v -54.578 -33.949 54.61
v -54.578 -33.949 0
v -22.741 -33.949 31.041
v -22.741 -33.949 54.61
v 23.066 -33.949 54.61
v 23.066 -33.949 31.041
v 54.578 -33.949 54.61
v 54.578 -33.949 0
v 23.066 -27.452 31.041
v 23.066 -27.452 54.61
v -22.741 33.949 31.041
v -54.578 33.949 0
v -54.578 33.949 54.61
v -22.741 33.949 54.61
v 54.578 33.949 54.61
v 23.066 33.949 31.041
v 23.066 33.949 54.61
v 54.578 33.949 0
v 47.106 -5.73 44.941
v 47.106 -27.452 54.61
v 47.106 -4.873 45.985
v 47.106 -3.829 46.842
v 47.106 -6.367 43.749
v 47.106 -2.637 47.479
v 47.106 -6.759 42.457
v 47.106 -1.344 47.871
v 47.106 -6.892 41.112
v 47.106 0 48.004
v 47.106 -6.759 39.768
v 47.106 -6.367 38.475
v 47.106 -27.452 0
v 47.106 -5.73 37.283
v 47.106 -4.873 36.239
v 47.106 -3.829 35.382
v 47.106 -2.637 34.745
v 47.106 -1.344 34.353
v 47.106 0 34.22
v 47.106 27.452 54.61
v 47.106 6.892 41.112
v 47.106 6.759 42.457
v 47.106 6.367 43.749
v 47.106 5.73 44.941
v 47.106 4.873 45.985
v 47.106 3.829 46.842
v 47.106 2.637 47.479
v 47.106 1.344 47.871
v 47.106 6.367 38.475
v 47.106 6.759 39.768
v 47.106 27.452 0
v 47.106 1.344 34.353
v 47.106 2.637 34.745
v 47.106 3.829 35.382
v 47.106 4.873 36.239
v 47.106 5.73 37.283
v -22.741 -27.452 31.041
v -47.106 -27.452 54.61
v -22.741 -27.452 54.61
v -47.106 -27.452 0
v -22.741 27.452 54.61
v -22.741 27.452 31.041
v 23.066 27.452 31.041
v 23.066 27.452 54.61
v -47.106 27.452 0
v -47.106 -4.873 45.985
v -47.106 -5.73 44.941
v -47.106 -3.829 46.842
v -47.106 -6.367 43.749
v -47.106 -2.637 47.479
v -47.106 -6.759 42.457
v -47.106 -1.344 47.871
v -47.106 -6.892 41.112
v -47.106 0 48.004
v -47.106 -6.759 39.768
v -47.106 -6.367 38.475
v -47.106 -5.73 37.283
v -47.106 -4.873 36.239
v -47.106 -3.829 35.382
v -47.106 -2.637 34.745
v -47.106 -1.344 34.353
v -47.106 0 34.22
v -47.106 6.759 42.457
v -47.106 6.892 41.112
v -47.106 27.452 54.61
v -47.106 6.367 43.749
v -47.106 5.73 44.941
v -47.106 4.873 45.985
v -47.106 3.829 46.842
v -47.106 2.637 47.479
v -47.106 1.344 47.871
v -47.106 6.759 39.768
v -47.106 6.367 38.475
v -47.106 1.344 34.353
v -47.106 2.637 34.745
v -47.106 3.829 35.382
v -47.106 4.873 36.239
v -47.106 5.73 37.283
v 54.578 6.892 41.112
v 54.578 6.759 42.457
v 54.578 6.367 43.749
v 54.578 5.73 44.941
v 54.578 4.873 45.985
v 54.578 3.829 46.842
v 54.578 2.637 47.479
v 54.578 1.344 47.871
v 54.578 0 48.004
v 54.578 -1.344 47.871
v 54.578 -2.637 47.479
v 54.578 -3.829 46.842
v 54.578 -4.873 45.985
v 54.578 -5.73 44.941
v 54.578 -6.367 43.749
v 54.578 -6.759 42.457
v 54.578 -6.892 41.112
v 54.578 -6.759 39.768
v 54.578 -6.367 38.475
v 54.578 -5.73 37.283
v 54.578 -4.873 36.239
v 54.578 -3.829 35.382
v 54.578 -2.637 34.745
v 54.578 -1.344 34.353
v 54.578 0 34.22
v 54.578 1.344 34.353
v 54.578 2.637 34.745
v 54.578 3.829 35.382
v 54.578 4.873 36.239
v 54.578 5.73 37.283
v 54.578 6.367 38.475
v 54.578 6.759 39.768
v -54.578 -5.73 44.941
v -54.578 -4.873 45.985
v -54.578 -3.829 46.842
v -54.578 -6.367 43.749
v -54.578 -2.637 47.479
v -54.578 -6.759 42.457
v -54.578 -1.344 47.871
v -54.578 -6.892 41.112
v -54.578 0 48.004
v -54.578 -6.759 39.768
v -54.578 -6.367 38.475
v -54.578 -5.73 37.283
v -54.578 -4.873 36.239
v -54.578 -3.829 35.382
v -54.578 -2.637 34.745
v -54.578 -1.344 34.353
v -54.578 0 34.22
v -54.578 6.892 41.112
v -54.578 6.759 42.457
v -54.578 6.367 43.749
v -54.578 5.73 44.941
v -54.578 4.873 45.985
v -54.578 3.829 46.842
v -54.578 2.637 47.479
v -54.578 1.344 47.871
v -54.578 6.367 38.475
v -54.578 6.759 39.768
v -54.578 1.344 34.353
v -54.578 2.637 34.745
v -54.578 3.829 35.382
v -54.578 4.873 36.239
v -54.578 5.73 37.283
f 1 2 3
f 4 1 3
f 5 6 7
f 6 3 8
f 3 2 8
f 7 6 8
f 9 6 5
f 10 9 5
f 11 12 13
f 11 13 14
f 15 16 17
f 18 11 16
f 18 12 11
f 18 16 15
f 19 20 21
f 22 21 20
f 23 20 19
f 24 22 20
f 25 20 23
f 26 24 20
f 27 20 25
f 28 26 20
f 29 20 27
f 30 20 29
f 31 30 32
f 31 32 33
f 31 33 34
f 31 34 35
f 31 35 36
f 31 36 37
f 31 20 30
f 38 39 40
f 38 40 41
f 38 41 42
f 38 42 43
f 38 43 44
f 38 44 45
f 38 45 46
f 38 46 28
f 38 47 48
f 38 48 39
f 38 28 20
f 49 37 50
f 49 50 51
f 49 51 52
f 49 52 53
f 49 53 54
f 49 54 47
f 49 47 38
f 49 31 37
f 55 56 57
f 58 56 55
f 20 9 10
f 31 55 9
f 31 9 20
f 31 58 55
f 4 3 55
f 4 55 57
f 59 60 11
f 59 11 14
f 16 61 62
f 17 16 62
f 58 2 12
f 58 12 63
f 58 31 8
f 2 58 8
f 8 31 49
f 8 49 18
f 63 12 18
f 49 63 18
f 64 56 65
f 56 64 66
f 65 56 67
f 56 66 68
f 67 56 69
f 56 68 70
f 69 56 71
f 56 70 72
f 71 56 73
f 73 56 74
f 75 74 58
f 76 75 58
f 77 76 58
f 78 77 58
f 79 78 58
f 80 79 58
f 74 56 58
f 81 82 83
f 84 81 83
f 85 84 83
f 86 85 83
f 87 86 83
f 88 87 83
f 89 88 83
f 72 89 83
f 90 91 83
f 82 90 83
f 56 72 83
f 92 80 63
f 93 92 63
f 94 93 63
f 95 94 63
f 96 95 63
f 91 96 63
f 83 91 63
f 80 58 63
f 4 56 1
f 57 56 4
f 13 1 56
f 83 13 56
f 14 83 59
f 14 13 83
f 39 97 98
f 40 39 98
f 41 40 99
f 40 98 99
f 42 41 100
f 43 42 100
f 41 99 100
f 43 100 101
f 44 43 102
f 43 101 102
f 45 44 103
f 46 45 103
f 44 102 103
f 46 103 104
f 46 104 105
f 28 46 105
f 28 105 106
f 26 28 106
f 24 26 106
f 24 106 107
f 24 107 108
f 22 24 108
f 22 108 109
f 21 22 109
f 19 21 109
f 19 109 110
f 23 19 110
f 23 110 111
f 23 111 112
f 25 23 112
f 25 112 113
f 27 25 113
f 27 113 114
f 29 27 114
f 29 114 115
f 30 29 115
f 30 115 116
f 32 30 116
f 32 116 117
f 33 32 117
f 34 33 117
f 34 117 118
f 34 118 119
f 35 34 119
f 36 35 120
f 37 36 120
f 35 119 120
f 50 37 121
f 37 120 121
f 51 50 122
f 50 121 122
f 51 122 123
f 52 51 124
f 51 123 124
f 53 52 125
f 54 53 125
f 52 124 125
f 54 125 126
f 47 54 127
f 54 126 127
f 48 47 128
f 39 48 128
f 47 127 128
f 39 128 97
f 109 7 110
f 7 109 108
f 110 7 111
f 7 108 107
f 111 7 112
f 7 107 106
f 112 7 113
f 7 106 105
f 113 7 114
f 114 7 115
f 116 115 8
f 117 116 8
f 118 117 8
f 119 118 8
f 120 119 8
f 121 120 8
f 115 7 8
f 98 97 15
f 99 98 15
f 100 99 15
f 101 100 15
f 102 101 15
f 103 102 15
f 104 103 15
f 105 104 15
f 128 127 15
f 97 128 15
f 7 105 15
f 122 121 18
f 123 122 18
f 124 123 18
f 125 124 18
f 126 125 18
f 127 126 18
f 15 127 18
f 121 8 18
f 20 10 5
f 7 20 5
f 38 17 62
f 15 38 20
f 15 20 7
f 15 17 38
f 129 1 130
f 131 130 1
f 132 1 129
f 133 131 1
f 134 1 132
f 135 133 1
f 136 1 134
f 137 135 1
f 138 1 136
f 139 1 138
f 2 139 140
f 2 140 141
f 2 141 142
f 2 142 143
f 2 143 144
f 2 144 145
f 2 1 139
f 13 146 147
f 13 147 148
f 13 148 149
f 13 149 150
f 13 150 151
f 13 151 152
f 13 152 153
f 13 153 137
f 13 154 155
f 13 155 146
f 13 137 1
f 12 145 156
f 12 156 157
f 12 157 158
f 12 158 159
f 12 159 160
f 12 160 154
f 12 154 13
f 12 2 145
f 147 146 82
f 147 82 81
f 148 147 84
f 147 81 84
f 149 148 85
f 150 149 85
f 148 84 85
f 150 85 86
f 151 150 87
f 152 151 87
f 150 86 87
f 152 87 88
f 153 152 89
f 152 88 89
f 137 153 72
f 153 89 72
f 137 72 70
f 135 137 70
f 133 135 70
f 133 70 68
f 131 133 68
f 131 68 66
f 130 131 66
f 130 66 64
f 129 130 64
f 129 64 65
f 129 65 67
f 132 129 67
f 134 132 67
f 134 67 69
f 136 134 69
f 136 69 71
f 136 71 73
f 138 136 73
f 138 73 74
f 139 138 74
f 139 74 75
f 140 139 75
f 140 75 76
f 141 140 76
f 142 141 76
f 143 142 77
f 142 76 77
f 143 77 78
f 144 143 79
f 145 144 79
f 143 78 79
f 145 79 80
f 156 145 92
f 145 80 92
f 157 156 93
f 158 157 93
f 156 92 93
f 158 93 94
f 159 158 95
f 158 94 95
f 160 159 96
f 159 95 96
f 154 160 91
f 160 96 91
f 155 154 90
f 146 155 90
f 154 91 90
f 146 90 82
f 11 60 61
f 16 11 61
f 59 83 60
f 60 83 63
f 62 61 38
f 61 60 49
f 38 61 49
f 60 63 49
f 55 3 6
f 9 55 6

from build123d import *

# Parameters (mm, degrees)
F0_W     = 109.156876
F0_H     = 67.89817
F0_W_2   = 94.212786
F0_H_2   = 54.903298
F1_DEPTH = 54.61
F2_W     = 45.806905
F2_H     = 23.568978
F3_DEPTH = 67.899169
F4_R     = 6.891568
F5_DEPTH = 109.157877


with BuildPart() as f1:
    # F0 (on Top) → F1 (new body)
    with BuildSketch(Plane.XY):
        Rectangle(F0_W, F0_H)
        Rectangle(F0_W_2, F0_H_2, mode=Mode.SUBTRACT)
    extrude(amount=F1_DEPTH)

    # F2 (on face) → F3 (cut, through all)
    with BuildSketch(Plane.XZ.offset(33.949085)):
        with Locations((0.162437, 42.825511)):
            Rectangle(F2_W, F2_H)
    extrude(amount=-F3_DEPTH, mode=Mode.SUBTRACT)

    # F4 (on face) → F5 (cut, through all)
    with BuildSketch(Plane.YZ.offset(54.578438)):
        with Locations((0, 41.11205)):
            Circle(F4_R)
    extrude(amount=-F5_DEPTH, mode=Mode.SUBTRACT)


solid = f1.part
